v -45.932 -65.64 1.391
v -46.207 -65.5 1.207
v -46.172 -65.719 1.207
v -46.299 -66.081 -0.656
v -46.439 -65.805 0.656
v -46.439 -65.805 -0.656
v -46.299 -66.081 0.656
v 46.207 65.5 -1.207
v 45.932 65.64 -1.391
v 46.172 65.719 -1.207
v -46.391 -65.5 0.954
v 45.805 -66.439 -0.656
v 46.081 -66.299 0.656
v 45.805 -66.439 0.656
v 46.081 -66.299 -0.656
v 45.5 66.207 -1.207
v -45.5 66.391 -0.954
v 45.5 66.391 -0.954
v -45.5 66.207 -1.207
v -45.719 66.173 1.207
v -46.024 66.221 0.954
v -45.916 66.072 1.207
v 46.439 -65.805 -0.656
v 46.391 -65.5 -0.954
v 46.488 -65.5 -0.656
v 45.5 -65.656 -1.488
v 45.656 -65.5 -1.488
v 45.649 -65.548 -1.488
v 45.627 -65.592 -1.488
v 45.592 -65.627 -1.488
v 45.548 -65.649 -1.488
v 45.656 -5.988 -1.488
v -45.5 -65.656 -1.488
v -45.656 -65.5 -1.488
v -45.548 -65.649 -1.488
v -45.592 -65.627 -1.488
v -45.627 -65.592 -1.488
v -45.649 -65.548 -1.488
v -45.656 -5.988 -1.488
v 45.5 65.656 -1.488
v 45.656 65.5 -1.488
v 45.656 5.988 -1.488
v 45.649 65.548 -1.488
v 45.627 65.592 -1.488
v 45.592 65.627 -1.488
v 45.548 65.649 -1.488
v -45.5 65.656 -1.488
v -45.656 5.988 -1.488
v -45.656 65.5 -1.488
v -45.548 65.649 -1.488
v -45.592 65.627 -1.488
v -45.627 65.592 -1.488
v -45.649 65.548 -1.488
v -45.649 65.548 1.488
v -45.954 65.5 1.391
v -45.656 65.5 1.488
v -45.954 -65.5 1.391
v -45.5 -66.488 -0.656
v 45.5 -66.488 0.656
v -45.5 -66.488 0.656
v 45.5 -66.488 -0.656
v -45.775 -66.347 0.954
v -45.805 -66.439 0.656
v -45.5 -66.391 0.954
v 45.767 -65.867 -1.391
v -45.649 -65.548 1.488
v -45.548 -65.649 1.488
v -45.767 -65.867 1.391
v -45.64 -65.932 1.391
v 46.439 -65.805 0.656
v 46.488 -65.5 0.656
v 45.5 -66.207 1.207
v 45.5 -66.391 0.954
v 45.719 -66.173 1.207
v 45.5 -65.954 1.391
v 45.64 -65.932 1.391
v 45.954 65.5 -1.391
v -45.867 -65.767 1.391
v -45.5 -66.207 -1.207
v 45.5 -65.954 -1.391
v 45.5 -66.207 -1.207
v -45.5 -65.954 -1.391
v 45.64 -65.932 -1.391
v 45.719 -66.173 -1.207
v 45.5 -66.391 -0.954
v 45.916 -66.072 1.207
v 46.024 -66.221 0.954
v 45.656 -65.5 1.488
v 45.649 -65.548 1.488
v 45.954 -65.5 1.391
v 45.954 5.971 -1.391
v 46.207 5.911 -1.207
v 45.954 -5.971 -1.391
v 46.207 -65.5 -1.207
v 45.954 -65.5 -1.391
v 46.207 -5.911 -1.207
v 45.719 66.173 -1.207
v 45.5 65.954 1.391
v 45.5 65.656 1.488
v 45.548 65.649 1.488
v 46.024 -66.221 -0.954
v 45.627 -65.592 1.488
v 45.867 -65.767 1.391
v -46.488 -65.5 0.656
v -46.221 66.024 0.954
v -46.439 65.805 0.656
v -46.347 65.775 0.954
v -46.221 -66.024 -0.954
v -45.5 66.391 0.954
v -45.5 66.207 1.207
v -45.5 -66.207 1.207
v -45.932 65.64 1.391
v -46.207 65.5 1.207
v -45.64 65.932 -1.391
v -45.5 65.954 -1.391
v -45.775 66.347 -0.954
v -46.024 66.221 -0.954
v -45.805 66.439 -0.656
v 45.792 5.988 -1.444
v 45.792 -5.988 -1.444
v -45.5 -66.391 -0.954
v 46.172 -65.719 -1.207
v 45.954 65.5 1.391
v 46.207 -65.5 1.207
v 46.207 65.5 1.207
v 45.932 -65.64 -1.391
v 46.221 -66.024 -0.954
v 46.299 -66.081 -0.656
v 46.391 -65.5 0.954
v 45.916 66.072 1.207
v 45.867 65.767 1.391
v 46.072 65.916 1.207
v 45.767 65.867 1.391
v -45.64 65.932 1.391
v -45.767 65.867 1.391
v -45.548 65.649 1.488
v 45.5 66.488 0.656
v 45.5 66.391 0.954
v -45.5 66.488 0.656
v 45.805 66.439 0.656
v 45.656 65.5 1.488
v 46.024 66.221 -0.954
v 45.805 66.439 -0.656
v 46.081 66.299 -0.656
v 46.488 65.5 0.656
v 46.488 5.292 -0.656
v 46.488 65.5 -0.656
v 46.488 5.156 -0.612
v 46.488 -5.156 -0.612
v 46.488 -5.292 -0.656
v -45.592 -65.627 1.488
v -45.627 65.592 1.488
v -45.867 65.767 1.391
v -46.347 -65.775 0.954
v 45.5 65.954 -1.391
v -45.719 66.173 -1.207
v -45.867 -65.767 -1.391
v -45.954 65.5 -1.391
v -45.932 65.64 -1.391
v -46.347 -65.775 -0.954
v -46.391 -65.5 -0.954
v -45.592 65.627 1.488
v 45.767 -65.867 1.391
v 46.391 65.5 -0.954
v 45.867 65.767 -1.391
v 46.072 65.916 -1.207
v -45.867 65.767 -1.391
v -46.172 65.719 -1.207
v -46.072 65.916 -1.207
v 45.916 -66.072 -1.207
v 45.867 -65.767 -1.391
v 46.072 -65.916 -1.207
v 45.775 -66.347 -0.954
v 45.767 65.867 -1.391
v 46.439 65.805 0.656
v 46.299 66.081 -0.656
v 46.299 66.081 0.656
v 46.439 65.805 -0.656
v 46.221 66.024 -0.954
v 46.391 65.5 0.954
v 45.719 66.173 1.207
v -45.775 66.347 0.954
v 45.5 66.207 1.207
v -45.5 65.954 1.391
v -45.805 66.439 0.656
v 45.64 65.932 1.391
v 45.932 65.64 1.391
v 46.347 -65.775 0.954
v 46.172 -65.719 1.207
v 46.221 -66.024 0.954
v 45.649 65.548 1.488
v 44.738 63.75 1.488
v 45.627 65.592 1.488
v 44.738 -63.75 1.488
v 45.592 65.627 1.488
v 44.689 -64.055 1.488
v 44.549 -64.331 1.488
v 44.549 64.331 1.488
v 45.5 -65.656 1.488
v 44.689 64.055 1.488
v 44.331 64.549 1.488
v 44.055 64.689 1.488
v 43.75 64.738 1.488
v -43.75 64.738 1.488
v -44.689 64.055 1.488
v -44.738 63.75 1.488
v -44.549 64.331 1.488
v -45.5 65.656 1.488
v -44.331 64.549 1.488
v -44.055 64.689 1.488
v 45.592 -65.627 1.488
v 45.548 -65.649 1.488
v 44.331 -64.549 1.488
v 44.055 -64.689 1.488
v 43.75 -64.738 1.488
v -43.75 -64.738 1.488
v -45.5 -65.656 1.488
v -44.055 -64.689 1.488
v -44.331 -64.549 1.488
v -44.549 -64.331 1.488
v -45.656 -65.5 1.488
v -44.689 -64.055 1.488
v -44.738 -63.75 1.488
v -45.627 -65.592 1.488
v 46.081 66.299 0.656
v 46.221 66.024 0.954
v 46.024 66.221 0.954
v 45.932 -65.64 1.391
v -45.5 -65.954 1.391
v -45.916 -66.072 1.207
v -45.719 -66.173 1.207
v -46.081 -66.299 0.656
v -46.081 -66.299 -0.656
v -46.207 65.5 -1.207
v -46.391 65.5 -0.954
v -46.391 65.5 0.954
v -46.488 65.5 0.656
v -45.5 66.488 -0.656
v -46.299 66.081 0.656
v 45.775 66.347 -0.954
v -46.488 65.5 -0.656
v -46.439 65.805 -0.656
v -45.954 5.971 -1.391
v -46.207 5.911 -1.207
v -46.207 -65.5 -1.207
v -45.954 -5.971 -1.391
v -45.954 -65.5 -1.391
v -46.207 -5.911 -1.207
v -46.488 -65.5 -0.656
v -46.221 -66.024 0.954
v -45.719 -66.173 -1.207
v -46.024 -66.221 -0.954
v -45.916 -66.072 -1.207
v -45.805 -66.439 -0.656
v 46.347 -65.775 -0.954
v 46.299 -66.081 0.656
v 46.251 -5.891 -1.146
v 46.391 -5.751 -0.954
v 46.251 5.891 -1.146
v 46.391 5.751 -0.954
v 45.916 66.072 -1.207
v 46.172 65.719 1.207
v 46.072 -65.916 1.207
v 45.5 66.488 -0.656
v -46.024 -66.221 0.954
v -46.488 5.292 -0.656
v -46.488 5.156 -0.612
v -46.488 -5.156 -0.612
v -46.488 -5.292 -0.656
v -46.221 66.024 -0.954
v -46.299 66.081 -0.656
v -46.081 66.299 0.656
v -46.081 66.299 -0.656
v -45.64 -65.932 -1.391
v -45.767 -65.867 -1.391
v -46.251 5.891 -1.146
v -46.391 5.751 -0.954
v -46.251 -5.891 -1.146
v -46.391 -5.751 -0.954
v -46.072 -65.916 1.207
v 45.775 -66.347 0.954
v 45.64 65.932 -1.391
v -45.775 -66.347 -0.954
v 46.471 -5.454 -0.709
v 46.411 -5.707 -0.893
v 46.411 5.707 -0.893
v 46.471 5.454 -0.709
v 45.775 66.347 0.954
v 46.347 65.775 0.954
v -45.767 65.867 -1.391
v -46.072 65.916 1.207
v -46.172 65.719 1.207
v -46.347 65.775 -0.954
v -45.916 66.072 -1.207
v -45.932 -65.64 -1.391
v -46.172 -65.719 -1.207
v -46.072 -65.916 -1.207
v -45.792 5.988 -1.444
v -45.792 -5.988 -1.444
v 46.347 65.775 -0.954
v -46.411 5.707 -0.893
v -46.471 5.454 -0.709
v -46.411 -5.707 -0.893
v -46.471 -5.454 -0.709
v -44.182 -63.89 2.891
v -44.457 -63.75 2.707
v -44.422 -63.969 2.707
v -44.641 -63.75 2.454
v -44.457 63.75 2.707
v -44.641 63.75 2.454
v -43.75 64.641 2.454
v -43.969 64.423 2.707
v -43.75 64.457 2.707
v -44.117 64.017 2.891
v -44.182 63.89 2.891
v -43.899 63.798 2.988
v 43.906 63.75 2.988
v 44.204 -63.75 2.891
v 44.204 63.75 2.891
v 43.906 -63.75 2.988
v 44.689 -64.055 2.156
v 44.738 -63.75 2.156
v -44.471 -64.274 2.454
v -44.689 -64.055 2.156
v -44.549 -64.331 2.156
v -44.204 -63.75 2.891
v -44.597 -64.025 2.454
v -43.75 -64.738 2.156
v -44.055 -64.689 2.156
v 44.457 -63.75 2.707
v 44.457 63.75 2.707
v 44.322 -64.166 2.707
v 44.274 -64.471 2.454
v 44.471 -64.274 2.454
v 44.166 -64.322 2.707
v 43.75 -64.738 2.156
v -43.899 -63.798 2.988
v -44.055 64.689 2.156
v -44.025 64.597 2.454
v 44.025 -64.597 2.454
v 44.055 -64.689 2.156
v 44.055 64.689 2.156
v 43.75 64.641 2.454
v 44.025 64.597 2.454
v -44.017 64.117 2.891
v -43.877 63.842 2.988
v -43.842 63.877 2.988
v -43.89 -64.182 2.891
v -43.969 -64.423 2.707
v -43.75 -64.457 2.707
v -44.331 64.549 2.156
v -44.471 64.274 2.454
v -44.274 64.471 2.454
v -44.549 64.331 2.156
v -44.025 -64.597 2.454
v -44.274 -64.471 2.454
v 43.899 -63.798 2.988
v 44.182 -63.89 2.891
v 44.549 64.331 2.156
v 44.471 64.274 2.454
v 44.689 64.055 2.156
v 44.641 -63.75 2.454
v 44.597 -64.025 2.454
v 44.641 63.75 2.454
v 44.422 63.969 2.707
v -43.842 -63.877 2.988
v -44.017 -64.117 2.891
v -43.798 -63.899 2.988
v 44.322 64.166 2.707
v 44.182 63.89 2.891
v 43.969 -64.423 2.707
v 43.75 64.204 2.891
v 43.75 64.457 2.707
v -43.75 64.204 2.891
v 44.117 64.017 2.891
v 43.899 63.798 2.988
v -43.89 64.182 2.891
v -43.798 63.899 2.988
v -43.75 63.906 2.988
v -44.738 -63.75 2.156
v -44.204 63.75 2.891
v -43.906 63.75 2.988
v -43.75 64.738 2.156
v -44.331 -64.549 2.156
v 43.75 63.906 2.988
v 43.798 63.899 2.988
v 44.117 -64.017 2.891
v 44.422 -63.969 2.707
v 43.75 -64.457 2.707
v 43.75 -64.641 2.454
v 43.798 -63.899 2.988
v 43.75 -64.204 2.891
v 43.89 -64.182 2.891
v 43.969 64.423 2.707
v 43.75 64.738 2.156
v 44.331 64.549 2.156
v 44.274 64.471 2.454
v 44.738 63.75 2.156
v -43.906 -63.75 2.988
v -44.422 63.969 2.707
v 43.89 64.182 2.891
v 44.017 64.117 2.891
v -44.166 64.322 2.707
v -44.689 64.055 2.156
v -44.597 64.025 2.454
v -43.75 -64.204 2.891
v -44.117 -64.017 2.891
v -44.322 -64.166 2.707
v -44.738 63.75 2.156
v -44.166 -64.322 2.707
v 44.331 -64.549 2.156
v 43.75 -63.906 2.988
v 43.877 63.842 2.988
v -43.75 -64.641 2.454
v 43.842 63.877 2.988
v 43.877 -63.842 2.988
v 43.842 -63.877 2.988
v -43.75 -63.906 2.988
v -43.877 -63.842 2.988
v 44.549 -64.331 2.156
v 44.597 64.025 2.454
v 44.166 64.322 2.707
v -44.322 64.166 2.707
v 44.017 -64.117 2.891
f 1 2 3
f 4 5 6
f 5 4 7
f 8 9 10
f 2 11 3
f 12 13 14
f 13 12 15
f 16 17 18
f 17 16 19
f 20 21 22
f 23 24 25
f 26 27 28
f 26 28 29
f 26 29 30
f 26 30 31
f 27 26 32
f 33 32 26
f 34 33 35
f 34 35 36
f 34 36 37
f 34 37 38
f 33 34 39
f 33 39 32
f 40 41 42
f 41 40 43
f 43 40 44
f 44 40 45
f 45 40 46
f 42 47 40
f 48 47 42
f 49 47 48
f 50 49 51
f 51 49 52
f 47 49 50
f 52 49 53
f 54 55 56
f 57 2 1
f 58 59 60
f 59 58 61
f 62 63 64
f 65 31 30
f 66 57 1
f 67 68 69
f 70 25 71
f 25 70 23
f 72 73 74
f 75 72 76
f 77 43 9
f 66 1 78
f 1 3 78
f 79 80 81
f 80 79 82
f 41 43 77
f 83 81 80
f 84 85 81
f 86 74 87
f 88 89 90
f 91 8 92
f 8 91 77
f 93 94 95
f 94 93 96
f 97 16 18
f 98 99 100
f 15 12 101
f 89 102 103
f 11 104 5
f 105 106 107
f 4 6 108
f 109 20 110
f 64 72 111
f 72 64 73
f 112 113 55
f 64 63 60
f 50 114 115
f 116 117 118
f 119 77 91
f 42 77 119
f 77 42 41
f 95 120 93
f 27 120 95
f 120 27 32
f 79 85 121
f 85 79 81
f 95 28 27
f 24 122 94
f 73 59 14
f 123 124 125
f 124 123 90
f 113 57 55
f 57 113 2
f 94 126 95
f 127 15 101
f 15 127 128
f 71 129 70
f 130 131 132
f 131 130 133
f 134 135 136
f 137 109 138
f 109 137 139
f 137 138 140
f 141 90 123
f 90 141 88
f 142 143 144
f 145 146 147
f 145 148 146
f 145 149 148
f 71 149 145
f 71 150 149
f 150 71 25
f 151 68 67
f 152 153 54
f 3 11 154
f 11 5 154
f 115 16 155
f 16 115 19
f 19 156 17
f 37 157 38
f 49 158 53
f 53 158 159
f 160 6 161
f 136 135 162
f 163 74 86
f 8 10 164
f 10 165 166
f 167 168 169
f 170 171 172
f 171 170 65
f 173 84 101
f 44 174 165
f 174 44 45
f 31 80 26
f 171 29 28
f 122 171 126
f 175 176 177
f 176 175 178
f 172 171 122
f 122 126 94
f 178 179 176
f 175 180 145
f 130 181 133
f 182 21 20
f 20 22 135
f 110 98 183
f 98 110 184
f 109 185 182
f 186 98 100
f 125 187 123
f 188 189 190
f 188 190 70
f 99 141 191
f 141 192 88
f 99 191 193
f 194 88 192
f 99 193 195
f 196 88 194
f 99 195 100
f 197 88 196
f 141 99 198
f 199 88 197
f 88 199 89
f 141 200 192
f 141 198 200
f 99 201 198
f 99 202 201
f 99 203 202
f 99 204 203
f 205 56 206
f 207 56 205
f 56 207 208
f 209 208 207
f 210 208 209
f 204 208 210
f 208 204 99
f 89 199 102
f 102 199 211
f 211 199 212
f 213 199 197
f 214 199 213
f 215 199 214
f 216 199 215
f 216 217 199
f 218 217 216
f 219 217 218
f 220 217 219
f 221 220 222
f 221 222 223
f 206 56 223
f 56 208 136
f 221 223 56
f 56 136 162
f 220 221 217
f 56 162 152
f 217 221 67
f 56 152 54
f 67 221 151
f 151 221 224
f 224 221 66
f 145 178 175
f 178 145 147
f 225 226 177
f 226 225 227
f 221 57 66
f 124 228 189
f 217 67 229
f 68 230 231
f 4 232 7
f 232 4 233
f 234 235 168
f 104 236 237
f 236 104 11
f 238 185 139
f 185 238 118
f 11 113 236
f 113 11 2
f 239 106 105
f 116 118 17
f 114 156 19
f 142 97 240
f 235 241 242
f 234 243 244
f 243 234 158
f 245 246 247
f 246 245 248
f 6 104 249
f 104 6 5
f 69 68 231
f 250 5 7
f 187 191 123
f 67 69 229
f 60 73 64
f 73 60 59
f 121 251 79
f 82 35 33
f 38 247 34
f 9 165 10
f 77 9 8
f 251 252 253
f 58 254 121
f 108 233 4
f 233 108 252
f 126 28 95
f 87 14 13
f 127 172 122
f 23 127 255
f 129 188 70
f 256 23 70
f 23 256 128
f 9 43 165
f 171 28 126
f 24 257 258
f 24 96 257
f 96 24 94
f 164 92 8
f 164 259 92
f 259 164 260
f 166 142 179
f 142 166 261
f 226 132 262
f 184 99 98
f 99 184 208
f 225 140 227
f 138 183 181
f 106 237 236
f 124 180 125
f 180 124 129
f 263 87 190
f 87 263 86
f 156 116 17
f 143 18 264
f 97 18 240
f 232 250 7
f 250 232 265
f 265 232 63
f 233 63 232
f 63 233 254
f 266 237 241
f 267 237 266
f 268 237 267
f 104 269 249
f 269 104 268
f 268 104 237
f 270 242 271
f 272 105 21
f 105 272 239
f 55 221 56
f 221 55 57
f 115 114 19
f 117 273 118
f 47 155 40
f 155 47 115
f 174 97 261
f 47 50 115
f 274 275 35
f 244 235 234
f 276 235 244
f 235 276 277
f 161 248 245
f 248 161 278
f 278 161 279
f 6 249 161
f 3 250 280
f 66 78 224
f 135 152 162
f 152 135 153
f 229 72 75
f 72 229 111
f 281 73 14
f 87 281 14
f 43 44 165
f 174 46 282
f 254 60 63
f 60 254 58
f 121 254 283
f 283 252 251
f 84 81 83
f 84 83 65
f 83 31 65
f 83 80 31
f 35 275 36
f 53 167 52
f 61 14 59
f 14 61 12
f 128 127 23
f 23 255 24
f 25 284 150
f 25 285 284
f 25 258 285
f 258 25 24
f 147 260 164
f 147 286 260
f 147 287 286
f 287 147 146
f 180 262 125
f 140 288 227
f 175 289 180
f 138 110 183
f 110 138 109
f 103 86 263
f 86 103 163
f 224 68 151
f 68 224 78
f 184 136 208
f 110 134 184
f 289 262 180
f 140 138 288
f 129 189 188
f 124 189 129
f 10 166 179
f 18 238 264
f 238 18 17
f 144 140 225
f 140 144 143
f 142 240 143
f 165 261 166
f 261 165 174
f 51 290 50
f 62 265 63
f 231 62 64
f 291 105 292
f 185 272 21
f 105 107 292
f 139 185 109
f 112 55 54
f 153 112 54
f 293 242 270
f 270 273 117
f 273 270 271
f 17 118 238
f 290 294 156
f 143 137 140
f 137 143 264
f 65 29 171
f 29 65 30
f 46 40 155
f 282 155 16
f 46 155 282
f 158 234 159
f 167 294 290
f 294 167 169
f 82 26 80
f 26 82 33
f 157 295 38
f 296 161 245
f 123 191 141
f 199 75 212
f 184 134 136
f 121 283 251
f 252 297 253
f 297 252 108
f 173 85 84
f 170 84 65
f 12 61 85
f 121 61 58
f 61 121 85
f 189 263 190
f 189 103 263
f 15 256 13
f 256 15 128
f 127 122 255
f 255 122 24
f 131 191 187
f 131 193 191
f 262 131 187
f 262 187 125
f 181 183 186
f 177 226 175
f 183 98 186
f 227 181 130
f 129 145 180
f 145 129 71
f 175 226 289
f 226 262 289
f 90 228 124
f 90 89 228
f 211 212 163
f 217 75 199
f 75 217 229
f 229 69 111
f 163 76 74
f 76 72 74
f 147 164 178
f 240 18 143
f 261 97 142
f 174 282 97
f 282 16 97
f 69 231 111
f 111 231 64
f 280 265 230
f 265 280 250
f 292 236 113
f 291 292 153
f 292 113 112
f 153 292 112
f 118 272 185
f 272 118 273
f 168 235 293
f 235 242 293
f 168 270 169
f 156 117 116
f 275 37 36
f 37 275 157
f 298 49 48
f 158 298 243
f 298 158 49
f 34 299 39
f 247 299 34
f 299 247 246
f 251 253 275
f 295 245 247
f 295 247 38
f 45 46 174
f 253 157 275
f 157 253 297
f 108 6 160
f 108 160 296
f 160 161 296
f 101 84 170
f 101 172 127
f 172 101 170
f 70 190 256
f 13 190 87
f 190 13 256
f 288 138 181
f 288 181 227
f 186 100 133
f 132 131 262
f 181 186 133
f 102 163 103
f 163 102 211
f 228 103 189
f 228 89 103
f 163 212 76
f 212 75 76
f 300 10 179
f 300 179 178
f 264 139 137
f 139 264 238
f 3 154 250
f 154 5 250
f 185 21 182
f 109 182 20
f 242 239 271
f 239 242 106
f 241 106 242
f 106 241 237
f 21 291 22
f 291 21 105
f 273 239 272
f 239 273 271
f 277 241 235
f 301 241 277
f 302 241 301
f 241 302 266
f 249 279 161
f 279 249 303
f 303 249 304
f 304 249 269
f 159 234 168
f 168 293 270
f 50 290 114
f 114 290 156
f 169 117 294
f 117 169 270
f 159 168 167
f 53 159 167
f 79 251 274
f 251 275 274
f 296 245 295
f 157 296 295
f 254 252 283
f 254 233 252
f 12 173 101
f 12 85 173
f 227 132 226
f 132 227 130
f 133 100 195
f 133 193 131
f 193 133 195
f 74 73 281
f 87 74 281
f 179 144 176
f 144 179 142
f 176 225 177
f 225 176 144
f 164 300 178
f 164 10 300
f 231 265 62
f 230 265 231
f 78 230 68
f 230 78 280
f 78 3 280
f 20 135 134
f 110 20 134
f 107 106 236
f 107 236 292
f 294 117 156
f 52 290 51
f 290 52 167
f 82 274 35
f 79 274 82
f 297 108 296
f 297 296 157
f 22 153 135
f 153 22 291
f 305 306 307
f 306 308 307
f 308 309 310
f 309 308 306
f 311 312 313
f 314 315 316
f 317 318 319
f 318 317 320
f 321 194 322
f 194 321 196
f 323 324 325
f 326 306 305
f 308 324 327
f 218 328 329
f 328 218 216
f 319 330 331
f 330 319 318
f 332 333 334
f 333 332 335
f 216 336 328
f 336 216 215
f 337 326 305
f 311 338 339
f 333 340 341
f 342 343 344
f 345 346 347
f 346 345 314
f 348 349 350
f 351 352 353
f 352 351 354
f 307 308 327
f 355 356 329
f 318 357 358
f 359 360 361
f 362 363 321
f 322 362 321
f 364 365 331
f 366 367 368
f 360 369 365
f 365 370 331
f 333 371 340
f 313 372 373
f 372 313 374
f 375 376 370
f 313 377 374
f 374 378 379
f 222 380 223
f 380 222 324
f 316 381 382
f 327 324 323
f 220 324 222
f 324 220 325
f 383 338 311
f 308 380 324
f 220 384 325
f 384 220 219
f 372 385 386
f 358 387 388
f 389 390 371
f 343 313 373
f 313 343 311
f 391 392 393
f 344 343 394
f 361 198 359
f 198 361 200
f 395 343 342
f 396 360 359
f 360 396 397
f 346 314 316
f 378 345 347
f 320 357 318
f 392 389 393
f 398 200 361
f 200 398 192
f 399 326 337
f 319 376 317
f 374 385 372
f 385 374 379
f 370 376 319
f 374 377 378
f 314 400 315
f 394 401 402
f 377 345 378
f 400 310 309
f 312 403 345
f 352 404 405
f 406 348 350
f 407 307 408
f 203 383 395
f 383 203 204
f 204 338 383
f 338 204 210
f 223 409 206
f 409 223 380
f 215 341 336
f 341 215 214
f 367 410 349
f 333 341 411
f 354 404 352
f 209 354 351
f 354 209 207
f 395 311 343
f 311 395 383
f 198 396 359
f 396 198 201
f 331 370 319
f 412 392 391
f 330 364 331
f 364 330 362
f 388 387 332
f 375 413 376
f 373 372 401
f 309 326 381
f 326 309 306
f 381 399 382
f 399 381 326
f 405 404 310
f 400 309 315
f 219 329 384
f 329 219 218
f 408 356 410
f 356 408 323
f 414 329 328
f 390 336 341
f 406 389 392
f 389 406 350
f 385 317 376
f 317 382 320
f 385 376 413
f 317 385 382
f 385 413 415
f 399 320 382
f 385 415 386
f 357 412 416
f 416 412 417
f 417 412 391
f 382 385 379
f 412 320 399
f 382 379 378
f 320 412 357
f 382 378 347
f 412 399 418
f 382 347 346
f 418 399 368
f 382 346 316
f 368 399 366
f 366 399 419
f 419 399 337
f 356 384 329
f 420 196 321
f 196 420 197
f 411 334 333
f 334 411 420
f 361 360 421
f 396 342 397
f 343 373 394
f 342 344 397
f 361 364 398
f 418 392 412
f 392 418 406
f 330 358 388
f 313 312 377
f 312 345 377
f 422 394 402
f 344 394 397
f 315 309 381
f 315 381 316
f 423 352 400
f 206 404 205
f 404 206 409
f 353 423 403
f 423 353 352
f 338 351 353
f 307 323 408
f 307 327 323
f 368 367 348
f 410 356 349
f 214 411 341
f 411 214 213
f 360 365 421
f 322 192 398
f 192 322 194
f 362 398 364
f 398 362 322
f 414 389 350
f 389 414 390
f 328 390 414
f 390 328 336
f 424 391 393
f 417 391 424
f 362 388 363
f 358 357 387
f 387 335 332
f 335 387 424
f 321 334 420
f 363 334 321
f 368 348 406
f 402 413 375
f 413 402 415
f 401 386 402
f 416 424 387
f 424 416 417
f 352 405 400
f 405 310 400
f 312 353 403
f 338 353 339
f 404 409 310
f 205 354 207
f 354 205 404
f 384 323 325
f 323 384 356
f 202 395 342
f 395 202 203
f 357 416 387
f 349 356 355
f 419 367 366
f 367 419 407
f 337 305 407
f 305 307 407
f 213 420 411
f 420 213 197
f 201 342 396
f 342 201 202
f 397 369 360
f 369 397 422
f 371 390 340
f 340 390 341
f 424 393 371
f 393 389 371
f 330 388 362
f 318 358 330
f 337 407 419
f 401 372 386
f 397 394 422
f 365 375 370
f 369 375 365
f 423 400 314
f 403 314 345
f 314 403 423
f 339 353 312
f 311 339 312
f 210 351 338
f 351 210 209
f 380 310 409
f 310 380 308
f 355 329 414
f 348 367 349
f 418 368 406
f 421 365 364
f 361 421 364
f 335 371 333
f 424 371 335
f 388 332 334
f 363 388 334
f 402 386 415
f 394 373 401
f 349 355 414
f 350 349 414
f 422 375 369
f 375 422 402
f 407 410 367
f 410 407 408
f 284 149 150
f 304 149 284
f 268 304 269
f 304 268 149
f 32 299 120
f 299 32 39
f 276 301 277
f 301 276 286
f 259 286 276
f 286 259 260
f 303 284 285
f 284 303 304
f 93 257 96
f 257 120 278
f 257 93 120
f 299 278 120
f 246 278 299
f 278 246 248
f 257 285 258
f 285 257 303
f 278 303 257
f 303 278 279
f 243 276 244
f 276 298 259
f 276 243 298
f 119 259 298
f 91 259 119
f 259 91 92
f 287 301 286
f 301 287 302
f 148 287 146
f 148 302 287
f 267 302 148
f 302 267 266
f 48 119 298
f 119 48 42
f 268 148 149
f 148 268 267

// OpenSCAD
// file: defines.scad
// Externally measured from box. This is the Internal dimensions reqiured for
// the box more or less

LENGTH = 130; // mm
WIDTH  =  90; // mm
HEIGHT =  38; // mm
WALL   =   3; // mm
STRAP  =  12; // mm
RADIUS =   1; // mm

BUFFER = 0.5; // mm - Buffer amount for the lid to make it fit proper

// The wall width must be smaller than the height

module rounded_cube1(dim, r, center=false) {
    scalar = [2*r, 2*r, 2*r];
    assert(dim > scalar);

    minkowski() {
        cube(dim-scalar, center=center);
        sphere(r, $fn=20);
    }
}
// main file
include <defines.scad>

module lid(width, length, wall, strap_width, radius=1, buffer=1) {
    assert(wall > 2*radius);
    difference() {
        union() {
            // Bigger piece (the lipped section)
            rounded_cube1([width+wall, length+wall, wall], r=radius, center=true);

            // Taller piece (allows nesting)
            translate([0, 0, wall/2]) rounded_cube1([width-buffer, length-buffer, wall], r=radius, center=true);
        }

        // Strap
        translate([0, 0, -wall/2-wall/4]) rounded_cube1([width+wall+wall, strap_width, 1.1*wall], r=radius, center=true);
    }
}

lid(WIDTH, LENGTH, WALL, STRAP, RADIUS, BUFFER);
